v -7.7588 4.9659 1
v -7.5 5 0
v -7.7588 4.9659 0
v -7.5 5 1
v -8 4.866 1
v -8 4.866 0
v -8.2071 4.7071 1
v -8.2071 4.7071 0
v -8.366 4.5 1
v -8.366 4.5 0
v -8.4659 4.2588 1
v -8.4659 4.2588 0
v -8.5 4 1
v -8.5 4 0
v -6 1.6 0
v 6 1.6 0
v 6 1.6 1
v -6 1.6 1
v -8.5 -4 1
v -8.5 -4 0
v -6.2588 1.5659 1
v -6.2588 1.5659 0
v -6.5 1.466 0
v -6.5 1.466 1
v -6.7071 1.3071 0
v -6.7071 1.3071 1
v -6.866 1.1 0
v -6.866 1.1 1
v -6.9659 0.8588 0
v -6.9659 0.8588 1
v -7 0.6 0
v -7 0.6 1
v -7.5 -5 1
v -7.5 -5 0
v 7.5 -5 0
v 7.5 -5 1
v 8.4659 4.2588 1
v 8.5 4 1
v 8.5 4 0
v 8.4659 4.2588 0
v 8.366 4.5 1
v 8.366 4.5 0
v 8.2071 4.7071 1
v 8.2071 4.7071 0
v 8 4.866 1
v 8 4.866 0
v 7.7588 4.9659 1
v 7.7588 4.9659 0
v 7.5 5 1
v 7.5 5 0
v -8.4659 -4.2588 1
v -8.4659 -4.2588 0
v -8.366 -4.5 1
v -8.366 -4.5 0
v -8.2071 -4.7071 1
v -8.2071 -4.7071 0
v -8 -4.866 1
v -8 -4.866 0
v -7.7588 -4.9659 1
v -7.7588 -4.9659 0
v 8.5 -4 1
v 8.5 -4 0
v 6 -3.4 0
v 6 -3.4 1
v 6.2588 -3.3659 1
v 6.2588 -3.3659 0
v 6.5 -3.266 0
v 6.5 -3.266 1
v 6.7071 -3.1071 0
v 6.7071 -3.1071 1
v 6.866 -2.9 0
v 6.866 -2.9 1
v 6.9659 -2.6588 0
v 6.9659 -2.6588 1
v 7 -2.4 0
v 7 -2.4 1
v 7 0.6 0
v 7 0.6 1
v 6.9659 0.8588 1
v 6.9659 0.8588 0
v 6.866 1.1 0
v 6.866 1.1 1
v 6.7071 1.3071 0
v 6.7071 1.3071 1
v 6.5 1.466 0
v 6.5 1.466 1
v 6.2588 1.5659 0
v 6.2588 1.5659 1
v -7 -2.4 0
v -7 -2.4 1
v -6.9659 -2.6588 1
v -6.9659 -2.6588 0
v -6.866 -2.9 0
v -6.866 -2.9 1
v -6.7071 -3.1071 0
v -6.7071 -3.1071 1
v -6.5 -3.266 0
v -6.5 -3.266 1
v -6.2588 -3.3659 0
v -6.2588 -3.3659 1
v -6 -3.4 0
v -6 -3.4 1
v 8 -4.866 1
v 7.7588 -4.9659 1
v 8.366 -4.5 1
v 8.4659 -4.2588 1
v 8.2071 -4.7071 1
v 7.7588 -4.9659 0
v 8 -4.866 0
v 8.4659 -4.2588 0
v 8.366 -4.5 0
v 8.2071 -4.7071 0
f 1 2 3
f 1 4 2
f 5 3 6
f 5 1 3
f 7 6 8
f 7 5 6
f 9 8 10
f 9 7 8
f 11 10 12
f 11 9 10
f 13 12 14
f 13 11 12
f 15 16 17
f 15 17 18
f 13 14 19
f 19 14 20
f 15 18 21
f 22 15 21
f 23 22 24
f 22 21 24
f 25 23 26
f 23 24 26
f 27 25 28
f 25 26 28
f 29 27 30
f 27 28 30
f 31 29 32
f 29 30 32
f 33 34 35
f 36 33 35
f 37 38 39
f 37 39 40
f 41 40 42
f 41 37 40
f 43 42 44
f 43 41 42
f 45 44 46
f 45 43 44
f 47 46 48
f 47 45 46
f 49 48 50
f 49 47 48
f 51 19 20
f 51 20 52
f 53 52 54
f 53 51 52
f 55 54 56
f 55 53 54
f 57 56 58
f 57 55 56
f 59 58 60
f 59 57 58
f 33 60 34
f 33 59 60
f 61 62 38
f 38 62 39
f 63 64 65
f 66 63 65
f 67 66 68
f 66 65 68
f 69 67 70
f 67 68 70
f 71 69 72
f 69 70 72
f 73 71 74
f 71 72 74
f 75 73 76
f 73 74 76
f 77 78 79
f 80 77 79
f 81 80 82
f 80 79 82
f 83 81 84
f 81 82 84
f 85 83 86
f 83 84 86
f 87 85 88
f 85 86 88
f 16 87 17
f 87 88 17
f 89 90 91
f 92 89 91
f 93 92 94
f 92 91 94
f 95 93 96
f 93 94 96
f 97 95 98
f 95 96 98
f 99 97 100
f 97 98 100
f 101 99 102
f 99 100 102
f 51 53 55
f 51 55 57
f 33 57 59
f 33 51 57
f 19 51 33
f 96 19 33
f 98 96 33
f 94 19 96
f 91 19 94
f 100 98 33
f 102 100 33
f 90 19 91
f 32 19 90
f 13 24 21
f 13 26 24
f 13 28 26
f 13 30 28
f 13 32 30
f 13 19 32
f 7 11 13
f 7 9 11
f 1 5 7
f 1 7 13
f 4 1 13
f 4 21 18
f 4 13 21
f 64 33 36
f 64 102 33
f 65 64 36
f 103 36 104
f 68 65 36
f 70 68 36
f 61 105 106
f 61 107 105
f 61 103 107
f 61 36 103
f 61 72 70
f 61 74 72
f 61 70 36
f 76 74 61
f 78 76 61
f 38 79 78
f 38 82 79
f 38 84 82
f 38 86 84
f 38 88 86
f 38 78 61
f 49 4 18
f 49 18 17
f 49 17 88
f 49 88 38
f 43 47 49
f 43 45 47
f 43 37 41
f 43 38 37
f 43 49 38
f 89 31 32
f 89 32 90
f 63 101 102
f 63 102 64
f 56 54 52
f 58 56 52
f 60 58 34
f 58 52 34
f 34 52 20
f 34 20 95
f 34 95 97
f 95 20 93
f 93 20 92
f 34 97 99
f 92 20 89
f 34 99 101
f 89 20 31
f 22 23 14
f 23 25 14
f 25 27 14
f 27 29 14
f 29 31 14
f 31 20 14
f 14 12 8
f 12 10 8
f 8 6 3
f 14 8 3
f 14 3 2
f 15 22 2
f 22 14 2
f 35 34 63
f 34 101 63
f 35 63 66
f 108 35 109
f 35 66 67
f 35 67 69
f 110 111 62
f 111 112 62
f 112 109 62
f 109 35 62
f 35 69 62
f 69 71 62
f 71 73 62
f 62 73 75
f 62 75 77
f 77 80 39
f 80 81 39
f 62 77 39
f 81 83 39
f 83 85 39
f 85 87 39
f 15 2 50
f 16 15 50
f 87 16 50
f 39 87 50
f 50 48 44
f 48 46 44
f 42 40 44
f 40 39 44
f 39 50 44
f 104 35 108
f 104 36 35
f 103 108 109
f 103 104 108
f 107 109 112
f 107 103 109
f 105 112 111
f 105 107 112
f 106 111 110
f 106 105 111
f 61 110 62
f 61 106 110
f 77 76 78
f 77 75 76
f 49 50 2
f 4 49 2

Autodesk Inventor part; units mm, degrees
ref_plane "YZ Plane" through (0, 0, 0) normal (1, 0, 0) x (0, 1, 0)
ref_plane "XZ Plane" through (0, 0, 0) normal (0, 1, 0) x (-1, 0, 0)
ref_plane "XY Plane" through (0, 0, 0) normal (0, 0, 1) x (1, 0, 0)
sketch "Sketch1" plane through (0, 0, 0) normal (0, 0, 1) x (1, 0, 0)
  line L0 (-8.5, -5) -> (8.5, -5)
  line L1 (8.5, -5) -> (8.5, 5)
  line L2 (8.5, 5) -> (-8.5, 5)
  line L3 (-8.5, 5) -> (-8.5, -5)
  line L4 (-8.5, -5) -> (8.5, 5) construction
  line L5 (8.5, -5) -> (-8.5, 5) construction
  line L6 (0, -7) -> (0, 7) construction
  line L7 (-7, -3.4) -> (7, -3.4)
  line L8 (7, -3.4) -> (7, 1.6)
  line L9 (7, 1.6) -> (-7, 1.6)
  line L10 (-7, 1.6) -> (-7, -3.4)
  line L11 (-7, -3.4) -> (7, 1.6) construction
  line L12 (7, -3.4) -> (-7, 1.6) construction
  point P0 (0, 0)
  point P1 (0, -0.9)
  dimension "d0" = 10
  dimension "d1" = 17
  dimension "d2" = 4.1
  dimension "d3" = 5
  dimension "d4" = 14
extrude "Extrusion1" add sketch "Sketch1" along normal blind 1
fillet "Fillet1" radius 1 4 edges at (8.5, 5, 0.5) (8.5, -5, 0.5) (-8.5, -5, 0.5) (-8.5, 5, 0.5)
fillet "Fillet2" radius 1 4 edges at (7, 1.6, 0.5) (7, -3.4, 0.5) (-7, -3.4, 0.5) (-7, 1.6, 0.5)
properties part number "CAMERA_CON_SPACER"
